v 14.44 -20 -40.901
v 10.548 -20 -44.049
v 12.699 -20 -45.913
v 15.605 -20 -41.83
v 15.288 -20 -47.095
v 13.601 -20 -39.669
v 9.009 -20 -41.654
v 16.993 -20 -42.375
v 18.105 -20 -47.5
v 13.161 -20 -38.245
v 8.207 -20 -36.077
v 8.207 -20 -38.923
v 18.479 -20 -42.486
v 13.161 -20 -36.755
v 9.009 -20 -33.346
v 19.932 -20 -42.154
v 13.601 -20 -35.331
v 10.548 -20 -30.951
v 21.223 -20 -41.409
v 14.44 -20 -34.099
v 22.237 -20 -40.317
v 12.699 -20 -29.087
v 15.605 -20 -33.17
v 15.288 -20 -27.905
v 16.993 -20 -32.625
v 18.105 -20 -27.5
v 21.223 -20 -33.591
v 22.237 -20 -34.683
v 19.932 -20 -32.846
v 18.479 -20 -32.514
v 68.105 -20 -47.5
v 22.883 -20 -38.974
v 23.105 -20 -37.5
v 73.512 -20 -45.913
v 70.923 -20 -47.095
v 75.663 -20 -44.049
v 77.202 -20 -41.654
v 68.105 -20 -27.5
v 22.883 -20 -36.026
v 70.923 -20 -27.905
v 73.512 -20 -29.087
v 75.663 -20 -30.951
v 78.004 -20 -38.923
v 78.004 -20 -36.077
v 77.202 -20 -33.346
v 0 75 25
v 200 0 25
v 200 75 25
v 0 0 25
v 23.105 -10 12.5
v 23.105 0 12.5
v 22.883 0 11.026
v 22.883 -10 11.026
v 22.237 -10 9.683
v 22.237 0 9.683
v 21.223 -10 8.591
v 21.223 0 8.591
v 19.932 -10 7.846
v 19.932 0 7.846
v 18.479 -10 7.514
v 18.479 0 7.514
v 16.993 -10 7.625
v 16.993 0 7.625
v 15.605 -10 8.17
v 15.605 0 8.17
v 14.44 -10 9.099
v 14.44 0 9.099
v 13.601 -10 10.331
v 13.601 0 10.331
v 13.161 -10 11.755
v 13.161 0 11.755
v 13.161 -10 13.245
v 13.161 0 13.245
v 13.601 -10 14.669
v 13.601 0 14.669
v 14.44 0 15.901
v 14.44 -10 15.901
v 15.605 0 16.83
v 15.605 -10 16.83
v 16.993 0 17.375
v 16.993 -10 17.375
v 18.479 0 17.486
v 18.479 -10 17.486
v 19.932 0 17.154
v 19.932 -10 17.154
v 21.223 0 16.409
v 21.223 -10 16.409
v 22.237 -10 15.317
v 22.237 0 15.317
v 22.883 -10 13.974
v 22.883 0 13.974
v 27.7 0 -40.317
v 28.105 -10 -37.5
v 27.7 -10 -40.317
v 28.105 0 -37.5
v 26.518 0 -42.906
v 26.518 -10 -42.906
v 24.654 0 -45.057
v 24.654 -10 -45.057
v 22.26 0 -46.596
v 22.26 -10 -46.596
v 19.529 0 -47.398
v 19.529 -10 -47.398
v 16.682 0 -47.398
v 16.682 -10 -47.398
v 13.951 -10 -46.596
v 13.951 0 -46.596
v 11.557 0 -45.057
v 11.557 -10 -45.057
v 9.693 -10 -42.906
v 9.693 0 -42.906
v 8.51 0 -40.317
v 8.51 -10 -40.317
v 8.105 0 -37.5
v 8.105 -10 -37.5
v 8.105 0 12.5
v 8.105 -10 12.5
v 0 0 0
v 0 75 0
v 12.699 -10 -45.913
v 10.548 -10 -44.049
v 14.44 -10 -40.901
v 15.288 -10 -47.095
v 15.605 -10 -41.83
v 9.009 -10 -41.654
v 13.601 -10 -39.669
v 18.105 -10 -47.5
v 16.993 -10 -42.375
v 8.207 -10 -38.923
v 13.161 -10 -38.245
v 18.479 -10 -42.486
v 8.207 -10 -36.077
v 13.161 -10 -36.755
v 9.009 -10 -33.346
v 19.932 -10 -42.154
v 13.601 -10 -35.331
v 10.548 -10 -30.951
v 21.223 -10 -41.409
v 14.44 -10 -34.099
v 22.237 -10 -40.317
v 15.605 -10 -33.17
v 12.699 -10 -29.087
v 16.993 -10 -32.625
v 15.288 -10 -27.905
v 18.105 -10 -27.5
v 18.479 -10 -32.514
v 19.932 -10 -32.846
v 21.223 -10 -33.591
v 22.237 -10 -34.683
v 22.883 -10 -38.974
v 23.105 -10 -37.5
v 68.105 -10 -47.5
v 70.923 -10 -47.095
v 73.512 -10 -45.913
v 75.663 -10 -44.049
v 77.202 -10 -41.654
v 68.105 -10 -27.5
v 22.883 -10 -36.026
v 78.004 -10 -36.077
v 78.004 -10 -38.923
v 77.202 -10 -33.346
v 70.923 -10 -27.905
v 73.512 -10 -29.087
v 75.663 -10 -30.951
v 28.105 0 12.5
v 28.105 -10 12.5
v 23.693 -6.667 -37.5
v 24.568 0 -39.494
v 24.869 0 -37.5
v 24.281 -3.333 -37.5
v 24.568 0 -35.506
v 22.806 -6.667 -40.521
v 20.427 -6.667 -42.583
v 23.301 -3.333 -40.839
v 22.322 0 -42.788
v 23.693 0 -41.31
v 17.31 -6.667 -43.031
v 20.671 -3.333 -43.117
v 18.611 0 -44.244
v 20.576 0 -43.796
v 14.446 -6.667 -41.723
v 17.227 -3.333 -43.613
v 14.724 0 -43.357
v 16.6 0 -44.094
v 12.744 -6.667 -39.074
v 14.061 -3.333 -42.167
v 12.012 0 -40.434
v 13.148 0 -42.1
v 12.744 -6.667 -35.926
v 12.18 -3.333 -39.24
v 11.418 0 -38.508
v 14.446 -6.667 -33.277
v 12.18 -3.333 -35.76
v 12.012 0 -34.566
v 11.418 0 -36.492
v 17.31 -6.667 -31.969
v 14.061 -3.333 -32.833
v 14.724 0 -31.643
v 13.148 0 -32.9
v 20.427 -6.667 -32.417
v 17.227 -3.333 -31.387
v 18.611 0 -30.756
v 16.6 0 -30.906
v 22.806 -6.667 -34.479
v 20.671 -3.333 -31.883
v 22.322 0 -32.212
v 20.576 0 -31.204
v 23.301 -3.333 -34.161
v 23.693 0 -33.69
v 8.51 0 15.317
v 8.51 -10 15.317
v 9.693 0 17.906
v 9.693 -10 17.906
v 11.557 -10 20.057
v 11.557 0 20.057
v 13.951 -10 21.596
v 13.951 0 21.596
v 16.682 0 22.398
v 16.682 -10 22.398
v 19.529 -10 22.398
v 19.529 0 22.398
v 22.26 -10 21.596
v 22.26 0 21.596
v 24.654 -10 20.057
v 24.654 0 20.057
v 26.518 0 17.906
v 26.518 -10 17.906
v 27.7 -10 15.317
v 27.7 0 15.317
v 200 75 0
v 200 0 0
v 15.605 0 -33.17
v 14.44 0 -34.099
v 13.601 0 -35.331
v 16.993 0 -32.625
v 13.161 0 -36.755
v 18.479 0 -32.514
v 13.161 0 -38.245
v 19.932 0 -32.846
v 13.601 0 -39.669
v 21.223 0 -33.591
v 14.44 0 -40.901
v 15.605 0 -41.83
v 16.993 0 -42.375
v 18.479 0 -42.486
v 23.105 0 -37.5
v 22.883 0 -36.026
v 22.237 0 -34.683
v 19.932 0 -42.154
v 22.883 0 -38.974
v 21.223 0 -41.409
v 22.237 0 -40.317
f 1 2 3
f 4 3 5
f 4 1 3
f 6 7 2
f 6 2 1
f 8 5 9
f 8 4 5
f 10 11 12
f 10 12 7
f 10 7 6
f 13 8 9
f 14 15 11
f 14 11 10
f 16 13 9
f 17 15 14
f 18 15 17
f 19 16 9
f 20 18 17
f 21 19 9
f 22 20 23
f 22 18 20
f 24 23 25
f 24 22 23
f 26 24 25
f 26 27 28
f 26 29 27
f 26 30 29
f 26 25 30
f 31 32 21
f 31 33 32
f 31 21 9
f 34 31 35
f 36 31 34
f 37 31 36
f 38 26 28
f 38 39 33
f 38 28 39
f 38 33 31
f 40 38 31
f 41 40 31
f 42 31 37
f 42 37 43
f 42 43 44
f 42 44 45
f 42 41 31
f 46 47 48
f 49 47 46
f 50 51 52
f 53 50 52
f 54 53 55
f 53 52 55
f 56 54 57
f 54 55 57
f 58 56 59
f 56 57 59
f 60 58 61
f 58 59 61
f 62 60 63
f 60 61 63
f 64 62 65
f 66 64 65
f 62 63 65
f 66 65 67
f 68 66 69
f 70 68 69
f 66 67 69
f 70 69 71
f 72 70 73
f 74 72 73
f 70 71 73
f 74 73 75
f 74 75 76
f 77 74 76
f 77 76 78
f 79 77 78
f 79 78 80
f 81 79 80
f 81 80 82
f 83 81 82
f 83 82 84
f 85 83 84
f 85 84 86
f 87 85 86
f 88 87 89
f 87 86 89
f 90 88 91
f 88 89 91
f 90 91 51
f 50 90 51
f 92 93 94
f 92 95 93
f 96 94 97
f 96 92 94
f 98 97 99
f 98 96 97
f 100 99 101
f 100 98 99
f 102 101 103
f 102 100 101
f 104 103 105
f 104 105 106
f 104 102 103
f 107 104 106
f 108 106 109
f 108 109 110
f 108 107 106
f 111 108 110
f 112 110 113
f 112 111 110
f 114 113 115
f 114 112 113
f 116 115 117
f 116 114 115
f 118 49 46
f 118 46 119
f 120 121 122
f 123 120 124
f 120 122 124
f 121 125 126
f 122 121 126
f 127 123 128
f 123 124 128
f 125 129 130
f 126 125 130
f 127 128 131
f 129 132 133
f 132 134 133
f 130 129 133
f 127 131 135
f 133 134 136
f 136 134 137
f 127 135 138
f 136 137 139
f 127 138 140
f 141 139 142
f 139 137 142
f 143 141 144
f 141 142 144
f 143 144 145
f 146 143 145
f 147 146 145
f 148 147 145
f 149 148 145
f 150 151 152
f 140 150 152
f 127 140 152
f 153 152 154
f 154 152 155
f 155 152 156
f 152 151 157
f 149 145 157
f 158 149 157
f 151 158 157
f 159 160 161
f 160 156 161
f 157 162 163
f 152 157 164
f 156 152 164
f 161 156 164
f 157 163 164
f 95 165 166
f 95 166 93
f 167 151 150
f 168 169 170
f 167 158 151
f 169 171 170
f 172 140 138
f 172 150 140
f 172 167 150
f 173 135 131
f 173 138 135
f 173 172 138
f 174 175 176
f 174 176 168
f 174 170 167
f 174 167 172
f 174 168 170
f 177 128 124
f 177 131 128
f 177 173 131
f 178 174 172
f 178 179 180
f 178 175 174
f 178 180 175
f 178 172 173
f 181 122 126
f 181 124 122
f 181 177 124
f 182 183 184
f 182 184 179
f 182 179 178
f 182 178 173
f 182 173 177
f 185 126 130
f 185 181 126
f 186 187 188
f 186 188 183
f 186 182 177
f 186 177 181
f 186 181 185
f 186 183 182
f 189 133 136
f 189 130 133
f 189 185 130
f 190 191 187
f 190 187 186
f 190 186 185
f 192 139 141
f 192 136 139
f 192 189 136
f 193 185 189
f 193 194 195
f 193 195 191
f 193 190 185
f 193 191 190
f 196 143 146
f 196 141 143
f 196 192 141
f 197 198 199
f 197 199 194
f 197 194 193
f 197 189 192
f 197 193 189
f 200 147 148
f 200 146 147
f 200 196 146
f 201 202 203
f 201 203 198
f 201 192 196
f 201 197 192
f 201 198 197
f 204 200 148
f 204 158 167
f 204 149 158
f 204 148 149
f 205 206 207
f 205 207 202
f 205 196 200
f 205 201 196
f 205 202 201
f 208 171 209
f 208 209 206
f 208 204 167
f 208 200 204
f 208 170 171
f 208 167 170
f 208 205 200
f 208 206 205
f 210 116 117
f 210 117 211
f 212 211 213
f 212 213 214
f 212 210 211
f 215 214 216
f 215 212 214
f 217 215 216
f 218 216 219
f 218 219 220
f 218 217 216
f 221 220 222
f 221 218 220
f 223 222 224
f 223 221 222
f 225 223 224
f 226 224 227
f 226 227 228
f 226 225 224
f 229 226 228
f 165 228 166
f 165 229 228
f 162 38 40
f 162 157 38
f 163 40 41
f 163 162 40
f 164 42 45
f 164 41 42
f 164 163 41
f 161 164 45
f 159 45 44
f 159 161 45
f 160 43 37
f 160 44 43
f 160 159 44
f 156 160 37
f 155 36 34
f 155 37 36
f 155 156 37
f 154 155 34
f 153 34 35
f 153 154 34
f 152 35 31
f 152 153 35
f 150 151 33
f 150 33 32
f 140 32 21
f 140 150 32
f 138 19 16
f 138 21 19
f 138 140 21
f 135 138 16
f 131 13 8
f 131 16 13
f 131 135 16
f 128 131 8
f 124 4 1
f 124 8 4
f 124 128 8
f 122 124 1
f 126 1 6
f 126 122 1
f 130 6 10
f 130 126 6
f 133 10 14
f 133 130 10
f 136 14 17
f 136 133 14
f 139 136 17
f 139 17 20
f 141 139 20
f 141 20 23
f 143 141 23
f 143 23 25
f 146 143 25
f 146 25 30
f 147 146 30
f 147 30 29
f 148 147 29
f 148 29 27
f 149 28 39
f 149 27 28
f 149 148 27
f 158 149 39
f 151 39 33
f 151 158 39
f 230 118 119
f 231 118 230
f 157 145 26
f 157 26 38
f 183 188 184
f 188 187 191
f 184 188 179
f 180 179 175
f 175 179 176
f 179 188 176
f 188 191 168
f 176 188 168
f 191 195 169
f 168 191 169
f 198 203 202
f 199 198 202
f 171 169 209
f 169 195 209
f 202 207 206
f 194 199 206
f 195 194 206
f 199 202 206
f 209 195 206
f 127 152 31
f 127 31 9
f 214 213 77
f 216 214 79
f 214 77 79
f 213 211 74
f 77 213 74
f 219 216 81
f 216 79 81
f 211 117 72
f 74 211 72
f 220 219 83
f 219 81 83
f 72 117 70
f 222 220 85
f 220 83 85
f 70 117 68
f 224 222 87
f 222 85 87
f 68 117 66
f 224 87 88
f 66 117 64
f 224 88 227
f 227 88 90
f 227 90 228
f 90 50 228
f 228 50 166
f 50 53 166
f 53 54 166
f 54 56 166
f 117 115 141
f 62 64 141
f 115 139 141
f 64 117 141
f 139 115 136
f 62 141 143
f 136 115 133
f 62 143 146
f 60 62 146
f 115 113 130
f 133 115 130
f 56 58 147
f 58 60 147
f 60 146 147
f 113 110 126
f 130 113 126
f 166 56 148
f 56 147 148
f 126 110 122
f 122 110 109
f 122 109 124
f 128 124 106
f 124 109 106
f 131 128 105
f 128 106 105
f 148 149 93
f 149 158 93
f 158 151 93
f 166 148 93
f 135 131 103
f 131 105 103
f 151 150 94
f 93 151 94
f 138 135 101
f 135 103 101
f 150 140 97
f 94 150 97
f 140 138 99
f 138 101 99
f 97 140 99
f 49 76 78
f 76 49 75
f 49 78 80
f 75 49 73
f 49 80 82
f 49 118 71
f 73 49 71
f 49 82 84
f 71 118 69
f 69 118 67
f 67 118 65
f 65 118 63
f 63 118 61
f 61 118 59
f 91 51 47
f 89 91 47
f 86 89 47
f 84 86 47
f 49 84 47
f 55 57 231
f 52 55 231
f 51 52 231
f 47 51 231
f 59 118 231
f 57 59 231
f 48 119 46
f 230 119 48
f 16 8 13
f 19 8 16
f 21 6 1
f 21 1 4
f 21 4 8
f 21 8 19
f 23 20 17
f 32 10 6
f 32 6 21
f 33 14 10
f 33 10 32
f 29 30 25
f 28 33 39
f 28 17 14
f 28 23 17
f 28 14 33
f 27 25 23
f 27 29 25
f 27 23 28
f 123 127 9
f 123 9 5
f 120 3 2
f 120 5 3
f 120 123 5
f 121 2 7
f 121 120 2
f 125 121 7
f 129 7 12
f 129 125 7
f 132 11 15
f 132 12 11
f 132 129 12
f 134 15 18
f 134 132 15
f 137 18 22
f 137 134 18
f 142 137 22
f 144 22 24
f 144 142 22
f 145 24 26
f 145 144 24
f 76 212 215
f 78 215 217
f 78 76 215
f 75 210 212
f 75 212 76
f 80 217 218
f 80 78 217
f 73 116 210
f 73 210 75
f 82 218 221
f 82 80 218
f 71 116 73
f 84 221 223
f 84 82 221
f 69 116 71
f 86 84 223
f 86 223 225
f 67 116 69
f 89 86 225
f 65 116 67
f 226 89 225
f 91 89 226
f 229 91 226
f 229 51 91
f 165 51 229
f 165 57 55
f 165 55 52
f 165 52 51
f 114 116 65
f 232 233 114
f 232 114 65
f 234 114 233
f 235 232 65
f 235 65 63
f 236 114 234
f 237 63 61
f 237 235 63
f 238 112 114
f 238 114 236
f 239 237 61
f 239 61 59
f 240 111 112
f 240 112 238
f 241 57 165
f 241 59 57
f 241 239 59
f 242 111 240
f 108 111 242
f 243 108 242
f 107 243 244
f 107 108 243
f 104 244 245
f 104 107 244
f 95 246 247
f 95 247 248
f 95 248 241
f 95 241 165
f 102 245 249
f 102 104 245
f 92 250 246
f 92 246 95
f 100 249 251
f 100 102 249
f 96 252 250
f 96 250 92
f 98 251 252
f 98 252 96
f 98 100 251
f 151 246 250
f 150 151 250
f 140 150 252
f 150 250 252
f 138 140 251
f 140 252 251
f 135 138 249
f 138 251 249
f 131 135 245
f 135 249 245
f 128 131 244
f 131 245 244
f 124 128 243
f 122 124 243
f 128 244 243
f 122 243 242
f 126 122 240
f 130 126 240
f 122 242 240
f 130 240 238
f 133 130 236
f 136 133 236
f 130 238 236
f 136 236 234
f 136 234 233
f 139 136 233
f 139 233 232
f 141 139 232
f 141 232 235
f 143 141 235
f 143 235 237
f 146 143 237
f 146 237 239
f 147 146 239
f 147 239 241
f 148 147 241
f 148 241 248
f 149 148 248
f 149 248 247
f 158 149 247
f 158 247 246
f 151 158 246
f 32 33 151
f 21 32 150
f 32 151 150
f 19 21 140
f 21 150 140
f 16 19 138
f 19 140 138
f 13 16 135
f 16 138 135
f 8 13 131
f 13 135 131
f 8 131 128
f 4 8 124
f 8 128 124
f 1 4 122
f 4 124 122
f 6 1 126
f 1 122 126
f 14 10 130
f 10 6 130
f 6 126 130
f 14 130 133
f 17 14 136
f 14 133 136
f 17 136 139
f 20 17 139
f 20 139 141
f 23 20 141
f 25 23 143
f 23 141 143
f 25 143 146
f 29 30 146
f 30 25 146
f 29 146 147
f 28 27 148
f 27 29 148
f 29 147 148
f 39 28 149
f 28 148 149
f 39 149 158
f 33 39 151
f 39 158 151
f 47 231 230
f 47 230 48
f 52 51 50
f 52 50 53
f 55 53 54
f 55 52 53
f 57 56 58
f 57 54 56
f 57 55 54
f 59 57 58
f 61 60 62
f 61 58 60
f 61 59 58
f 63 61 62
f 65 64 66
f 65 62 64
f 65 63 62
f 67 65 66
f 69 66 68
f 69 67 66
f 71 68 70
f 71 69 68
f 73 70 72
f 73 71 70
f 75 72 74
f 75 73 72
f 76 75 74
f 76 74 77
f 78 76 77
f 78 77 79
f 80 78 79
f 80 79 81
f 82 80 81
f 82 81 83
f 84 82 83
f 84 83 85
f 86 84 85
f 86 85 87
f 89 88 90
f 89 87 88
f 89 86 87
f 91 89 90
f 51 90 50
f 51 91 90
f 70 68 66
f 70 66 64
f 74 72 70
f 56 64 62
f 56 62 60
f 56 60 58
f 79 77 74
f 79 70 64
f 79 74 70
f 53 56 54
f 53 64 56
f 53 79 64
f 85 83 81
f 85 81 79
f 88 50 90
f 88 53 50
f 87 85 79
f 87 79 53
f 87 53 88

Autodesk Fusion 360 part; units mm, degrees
sketch "Sketch1" plane through (0, 0, 0) normal (0, 1, 0) x (1, 0, 0) in component "QUADRIL"
  line L0 (0, 0) -> (200, 0)
  line L1 (200, 0) -> (200, -25)
  line L2 (200, -25) -> (0, -25)
  line L3 (0, -25) -> (0, 0)
  dimension "d1" = 200
  dimension "d2" = 25
extrude "Extrude1" add sketch "Sketch1" along normal blind 75 makes body 1 in component "QUADRIL"
sketch "Sketch2" plane through (0, 0, 0) normal (0, -1, 0) x (1, 0, 0) in component "QUADRIL"
  line L0 (200, 25) -> (0, 25)
  line L1 (0, 25) -> (0, 0)
  line L2 (0, 0) -> (200, 0)
  line L3 (200, 0) -> (200, 25)
  circle A0 centre (18.1054, 12.5) radius 5
  dimension "d5" = 10
  dimension "d6" = 12.5
  dimension "d7" = 18.1054
extrude "Extrude2" add sketch "Sketch2" along normal blind 10 contours A0 bodies 1 in component "QUADRIL"
sketch "Sketch2 (2)" plane through (0, 0, 0) normal (0, 1, 0) x (1, 0, 0) in component "COXA"
  circle A0 centre (18.1054, -12.5) radius 5
  circle A1 centre (18.1054, -12.5) radius 10
  line L0 (8.1054, -12.5) -> (28.1054, -12.5)
  line L1 (28.1054, -12.5) -> (28.1054, 37.5)
  line L2 (28.1054, 37.5) -> (8.1054, 37.5)
  line L3 (8.1054, 37.5) -> (8.1054, -12.5)
  circle A2 centre (18.1054, 37.5) radius 10
  circle A3 centre (18.1054, 37.5) radius 5
  dimension "d10" = 20
  dimension "d11" = 50
  dimension "d14" = 10
extrude "Extrude1'" add sketch "Sketch2 (2)" against normal blind 10 separate body contours A0 A1 L0 | A0 A1 L0 | A1 L1 L3 A2 | L2 A2 A3 | L2 A2 A3 makes body 2 in component "COXA"
sketch "Sketch1 (2)" plane through (0, -10, 0) normal (0, -1, 0) x (1, 0, 0) in component "PERNA"
  circle A0 centre (18.1054, 12.5) radius 5
  circle A1 centre (18.1054, -37.5) radius 5
  arc A2 (8.1054, -37.5) -> (28.1054, -37.5) centre (18.1054, -37.5) ccw
  line L0 (28.1054, -37.5) -> (28.1054, 12.5)
  arc A3 (28.1054, 12.5) -> (8.1054, 12.5) centre (18.1054, 12.5) ccw
  line L1 (8.1054, 12.5) -> (8.1054, -37.5)
  circle A4 centre (18.1054, -37.5) radius 5
  circle A5 centre (18.1054, -37.5) radius 10
  line L2 (18.1054, -47.5) -> (18.1054, -27.5)
  line L3 (18.1054, -27.5) -> (68.1054, -27.5)
  line L4 (68.1054, -27.5) -> (68.1054, -47.5)
  line L5 (68.1054, -47.5) -> (18.1054, -47.5)
  circle A6 centre (68.1054, -37.5) radius 10
  dimension "d15" = 50
extrude "Extrude1''" add sketch "Sketch1 (2)" along normal blind 10 separate body contours A1 A2 A4 A5 L2 | A1 A2 A4 A5 L2 | L0 A5 L3 | A2 L0 A5 L3 L5 A6 | L4 A6 | L4 A6 makes body 3 in component "PERNA"
sketch "Sketch3" plane through (0, -10, 0) normal (0, -1, 0) x (1, 0, 0) in component "COXA"
  circle A0 centre (18.1054, 12.5) radius 5
  circle A1 centre (18.1054, -37.5) radius 5
  arc A2 (8.1054, -37.5) -> (28.1054, -37.5) centre (18.1054, -37.5) ccw
  line L0 (28.1054, -37.5) -> (28.1054, 12.5)
  arc A3 (28.1054, 12.5) -> (8.1054, 12.5) centre (18.1054, 12.5) ccw
  line L1 (8.1054, 12.5) -> (8.1054, -37.5)
  circle A4 centre (18.1054, -37.5) radius 5
extrude "Extrude2'" add sketch "Sketch3" along normal blind 10 and the other way blind 10 draft 10 separate body contours A1 A4 makes body 4 in component "COXA"
component "PERNA" placed x (1, 0, 0) y (0, 1, 0) z (0, 0, 1) at (0, 0, 0)
component "COXA" placed x (1, 0, 0) y (0, 1, 0) z (0, 0, 1) at (0, 0, 0)
component "QUADRIL" placed x (1, 0, 0) y (0, 1, 0) z (0, 0, 1) at (0, 0, 0)
